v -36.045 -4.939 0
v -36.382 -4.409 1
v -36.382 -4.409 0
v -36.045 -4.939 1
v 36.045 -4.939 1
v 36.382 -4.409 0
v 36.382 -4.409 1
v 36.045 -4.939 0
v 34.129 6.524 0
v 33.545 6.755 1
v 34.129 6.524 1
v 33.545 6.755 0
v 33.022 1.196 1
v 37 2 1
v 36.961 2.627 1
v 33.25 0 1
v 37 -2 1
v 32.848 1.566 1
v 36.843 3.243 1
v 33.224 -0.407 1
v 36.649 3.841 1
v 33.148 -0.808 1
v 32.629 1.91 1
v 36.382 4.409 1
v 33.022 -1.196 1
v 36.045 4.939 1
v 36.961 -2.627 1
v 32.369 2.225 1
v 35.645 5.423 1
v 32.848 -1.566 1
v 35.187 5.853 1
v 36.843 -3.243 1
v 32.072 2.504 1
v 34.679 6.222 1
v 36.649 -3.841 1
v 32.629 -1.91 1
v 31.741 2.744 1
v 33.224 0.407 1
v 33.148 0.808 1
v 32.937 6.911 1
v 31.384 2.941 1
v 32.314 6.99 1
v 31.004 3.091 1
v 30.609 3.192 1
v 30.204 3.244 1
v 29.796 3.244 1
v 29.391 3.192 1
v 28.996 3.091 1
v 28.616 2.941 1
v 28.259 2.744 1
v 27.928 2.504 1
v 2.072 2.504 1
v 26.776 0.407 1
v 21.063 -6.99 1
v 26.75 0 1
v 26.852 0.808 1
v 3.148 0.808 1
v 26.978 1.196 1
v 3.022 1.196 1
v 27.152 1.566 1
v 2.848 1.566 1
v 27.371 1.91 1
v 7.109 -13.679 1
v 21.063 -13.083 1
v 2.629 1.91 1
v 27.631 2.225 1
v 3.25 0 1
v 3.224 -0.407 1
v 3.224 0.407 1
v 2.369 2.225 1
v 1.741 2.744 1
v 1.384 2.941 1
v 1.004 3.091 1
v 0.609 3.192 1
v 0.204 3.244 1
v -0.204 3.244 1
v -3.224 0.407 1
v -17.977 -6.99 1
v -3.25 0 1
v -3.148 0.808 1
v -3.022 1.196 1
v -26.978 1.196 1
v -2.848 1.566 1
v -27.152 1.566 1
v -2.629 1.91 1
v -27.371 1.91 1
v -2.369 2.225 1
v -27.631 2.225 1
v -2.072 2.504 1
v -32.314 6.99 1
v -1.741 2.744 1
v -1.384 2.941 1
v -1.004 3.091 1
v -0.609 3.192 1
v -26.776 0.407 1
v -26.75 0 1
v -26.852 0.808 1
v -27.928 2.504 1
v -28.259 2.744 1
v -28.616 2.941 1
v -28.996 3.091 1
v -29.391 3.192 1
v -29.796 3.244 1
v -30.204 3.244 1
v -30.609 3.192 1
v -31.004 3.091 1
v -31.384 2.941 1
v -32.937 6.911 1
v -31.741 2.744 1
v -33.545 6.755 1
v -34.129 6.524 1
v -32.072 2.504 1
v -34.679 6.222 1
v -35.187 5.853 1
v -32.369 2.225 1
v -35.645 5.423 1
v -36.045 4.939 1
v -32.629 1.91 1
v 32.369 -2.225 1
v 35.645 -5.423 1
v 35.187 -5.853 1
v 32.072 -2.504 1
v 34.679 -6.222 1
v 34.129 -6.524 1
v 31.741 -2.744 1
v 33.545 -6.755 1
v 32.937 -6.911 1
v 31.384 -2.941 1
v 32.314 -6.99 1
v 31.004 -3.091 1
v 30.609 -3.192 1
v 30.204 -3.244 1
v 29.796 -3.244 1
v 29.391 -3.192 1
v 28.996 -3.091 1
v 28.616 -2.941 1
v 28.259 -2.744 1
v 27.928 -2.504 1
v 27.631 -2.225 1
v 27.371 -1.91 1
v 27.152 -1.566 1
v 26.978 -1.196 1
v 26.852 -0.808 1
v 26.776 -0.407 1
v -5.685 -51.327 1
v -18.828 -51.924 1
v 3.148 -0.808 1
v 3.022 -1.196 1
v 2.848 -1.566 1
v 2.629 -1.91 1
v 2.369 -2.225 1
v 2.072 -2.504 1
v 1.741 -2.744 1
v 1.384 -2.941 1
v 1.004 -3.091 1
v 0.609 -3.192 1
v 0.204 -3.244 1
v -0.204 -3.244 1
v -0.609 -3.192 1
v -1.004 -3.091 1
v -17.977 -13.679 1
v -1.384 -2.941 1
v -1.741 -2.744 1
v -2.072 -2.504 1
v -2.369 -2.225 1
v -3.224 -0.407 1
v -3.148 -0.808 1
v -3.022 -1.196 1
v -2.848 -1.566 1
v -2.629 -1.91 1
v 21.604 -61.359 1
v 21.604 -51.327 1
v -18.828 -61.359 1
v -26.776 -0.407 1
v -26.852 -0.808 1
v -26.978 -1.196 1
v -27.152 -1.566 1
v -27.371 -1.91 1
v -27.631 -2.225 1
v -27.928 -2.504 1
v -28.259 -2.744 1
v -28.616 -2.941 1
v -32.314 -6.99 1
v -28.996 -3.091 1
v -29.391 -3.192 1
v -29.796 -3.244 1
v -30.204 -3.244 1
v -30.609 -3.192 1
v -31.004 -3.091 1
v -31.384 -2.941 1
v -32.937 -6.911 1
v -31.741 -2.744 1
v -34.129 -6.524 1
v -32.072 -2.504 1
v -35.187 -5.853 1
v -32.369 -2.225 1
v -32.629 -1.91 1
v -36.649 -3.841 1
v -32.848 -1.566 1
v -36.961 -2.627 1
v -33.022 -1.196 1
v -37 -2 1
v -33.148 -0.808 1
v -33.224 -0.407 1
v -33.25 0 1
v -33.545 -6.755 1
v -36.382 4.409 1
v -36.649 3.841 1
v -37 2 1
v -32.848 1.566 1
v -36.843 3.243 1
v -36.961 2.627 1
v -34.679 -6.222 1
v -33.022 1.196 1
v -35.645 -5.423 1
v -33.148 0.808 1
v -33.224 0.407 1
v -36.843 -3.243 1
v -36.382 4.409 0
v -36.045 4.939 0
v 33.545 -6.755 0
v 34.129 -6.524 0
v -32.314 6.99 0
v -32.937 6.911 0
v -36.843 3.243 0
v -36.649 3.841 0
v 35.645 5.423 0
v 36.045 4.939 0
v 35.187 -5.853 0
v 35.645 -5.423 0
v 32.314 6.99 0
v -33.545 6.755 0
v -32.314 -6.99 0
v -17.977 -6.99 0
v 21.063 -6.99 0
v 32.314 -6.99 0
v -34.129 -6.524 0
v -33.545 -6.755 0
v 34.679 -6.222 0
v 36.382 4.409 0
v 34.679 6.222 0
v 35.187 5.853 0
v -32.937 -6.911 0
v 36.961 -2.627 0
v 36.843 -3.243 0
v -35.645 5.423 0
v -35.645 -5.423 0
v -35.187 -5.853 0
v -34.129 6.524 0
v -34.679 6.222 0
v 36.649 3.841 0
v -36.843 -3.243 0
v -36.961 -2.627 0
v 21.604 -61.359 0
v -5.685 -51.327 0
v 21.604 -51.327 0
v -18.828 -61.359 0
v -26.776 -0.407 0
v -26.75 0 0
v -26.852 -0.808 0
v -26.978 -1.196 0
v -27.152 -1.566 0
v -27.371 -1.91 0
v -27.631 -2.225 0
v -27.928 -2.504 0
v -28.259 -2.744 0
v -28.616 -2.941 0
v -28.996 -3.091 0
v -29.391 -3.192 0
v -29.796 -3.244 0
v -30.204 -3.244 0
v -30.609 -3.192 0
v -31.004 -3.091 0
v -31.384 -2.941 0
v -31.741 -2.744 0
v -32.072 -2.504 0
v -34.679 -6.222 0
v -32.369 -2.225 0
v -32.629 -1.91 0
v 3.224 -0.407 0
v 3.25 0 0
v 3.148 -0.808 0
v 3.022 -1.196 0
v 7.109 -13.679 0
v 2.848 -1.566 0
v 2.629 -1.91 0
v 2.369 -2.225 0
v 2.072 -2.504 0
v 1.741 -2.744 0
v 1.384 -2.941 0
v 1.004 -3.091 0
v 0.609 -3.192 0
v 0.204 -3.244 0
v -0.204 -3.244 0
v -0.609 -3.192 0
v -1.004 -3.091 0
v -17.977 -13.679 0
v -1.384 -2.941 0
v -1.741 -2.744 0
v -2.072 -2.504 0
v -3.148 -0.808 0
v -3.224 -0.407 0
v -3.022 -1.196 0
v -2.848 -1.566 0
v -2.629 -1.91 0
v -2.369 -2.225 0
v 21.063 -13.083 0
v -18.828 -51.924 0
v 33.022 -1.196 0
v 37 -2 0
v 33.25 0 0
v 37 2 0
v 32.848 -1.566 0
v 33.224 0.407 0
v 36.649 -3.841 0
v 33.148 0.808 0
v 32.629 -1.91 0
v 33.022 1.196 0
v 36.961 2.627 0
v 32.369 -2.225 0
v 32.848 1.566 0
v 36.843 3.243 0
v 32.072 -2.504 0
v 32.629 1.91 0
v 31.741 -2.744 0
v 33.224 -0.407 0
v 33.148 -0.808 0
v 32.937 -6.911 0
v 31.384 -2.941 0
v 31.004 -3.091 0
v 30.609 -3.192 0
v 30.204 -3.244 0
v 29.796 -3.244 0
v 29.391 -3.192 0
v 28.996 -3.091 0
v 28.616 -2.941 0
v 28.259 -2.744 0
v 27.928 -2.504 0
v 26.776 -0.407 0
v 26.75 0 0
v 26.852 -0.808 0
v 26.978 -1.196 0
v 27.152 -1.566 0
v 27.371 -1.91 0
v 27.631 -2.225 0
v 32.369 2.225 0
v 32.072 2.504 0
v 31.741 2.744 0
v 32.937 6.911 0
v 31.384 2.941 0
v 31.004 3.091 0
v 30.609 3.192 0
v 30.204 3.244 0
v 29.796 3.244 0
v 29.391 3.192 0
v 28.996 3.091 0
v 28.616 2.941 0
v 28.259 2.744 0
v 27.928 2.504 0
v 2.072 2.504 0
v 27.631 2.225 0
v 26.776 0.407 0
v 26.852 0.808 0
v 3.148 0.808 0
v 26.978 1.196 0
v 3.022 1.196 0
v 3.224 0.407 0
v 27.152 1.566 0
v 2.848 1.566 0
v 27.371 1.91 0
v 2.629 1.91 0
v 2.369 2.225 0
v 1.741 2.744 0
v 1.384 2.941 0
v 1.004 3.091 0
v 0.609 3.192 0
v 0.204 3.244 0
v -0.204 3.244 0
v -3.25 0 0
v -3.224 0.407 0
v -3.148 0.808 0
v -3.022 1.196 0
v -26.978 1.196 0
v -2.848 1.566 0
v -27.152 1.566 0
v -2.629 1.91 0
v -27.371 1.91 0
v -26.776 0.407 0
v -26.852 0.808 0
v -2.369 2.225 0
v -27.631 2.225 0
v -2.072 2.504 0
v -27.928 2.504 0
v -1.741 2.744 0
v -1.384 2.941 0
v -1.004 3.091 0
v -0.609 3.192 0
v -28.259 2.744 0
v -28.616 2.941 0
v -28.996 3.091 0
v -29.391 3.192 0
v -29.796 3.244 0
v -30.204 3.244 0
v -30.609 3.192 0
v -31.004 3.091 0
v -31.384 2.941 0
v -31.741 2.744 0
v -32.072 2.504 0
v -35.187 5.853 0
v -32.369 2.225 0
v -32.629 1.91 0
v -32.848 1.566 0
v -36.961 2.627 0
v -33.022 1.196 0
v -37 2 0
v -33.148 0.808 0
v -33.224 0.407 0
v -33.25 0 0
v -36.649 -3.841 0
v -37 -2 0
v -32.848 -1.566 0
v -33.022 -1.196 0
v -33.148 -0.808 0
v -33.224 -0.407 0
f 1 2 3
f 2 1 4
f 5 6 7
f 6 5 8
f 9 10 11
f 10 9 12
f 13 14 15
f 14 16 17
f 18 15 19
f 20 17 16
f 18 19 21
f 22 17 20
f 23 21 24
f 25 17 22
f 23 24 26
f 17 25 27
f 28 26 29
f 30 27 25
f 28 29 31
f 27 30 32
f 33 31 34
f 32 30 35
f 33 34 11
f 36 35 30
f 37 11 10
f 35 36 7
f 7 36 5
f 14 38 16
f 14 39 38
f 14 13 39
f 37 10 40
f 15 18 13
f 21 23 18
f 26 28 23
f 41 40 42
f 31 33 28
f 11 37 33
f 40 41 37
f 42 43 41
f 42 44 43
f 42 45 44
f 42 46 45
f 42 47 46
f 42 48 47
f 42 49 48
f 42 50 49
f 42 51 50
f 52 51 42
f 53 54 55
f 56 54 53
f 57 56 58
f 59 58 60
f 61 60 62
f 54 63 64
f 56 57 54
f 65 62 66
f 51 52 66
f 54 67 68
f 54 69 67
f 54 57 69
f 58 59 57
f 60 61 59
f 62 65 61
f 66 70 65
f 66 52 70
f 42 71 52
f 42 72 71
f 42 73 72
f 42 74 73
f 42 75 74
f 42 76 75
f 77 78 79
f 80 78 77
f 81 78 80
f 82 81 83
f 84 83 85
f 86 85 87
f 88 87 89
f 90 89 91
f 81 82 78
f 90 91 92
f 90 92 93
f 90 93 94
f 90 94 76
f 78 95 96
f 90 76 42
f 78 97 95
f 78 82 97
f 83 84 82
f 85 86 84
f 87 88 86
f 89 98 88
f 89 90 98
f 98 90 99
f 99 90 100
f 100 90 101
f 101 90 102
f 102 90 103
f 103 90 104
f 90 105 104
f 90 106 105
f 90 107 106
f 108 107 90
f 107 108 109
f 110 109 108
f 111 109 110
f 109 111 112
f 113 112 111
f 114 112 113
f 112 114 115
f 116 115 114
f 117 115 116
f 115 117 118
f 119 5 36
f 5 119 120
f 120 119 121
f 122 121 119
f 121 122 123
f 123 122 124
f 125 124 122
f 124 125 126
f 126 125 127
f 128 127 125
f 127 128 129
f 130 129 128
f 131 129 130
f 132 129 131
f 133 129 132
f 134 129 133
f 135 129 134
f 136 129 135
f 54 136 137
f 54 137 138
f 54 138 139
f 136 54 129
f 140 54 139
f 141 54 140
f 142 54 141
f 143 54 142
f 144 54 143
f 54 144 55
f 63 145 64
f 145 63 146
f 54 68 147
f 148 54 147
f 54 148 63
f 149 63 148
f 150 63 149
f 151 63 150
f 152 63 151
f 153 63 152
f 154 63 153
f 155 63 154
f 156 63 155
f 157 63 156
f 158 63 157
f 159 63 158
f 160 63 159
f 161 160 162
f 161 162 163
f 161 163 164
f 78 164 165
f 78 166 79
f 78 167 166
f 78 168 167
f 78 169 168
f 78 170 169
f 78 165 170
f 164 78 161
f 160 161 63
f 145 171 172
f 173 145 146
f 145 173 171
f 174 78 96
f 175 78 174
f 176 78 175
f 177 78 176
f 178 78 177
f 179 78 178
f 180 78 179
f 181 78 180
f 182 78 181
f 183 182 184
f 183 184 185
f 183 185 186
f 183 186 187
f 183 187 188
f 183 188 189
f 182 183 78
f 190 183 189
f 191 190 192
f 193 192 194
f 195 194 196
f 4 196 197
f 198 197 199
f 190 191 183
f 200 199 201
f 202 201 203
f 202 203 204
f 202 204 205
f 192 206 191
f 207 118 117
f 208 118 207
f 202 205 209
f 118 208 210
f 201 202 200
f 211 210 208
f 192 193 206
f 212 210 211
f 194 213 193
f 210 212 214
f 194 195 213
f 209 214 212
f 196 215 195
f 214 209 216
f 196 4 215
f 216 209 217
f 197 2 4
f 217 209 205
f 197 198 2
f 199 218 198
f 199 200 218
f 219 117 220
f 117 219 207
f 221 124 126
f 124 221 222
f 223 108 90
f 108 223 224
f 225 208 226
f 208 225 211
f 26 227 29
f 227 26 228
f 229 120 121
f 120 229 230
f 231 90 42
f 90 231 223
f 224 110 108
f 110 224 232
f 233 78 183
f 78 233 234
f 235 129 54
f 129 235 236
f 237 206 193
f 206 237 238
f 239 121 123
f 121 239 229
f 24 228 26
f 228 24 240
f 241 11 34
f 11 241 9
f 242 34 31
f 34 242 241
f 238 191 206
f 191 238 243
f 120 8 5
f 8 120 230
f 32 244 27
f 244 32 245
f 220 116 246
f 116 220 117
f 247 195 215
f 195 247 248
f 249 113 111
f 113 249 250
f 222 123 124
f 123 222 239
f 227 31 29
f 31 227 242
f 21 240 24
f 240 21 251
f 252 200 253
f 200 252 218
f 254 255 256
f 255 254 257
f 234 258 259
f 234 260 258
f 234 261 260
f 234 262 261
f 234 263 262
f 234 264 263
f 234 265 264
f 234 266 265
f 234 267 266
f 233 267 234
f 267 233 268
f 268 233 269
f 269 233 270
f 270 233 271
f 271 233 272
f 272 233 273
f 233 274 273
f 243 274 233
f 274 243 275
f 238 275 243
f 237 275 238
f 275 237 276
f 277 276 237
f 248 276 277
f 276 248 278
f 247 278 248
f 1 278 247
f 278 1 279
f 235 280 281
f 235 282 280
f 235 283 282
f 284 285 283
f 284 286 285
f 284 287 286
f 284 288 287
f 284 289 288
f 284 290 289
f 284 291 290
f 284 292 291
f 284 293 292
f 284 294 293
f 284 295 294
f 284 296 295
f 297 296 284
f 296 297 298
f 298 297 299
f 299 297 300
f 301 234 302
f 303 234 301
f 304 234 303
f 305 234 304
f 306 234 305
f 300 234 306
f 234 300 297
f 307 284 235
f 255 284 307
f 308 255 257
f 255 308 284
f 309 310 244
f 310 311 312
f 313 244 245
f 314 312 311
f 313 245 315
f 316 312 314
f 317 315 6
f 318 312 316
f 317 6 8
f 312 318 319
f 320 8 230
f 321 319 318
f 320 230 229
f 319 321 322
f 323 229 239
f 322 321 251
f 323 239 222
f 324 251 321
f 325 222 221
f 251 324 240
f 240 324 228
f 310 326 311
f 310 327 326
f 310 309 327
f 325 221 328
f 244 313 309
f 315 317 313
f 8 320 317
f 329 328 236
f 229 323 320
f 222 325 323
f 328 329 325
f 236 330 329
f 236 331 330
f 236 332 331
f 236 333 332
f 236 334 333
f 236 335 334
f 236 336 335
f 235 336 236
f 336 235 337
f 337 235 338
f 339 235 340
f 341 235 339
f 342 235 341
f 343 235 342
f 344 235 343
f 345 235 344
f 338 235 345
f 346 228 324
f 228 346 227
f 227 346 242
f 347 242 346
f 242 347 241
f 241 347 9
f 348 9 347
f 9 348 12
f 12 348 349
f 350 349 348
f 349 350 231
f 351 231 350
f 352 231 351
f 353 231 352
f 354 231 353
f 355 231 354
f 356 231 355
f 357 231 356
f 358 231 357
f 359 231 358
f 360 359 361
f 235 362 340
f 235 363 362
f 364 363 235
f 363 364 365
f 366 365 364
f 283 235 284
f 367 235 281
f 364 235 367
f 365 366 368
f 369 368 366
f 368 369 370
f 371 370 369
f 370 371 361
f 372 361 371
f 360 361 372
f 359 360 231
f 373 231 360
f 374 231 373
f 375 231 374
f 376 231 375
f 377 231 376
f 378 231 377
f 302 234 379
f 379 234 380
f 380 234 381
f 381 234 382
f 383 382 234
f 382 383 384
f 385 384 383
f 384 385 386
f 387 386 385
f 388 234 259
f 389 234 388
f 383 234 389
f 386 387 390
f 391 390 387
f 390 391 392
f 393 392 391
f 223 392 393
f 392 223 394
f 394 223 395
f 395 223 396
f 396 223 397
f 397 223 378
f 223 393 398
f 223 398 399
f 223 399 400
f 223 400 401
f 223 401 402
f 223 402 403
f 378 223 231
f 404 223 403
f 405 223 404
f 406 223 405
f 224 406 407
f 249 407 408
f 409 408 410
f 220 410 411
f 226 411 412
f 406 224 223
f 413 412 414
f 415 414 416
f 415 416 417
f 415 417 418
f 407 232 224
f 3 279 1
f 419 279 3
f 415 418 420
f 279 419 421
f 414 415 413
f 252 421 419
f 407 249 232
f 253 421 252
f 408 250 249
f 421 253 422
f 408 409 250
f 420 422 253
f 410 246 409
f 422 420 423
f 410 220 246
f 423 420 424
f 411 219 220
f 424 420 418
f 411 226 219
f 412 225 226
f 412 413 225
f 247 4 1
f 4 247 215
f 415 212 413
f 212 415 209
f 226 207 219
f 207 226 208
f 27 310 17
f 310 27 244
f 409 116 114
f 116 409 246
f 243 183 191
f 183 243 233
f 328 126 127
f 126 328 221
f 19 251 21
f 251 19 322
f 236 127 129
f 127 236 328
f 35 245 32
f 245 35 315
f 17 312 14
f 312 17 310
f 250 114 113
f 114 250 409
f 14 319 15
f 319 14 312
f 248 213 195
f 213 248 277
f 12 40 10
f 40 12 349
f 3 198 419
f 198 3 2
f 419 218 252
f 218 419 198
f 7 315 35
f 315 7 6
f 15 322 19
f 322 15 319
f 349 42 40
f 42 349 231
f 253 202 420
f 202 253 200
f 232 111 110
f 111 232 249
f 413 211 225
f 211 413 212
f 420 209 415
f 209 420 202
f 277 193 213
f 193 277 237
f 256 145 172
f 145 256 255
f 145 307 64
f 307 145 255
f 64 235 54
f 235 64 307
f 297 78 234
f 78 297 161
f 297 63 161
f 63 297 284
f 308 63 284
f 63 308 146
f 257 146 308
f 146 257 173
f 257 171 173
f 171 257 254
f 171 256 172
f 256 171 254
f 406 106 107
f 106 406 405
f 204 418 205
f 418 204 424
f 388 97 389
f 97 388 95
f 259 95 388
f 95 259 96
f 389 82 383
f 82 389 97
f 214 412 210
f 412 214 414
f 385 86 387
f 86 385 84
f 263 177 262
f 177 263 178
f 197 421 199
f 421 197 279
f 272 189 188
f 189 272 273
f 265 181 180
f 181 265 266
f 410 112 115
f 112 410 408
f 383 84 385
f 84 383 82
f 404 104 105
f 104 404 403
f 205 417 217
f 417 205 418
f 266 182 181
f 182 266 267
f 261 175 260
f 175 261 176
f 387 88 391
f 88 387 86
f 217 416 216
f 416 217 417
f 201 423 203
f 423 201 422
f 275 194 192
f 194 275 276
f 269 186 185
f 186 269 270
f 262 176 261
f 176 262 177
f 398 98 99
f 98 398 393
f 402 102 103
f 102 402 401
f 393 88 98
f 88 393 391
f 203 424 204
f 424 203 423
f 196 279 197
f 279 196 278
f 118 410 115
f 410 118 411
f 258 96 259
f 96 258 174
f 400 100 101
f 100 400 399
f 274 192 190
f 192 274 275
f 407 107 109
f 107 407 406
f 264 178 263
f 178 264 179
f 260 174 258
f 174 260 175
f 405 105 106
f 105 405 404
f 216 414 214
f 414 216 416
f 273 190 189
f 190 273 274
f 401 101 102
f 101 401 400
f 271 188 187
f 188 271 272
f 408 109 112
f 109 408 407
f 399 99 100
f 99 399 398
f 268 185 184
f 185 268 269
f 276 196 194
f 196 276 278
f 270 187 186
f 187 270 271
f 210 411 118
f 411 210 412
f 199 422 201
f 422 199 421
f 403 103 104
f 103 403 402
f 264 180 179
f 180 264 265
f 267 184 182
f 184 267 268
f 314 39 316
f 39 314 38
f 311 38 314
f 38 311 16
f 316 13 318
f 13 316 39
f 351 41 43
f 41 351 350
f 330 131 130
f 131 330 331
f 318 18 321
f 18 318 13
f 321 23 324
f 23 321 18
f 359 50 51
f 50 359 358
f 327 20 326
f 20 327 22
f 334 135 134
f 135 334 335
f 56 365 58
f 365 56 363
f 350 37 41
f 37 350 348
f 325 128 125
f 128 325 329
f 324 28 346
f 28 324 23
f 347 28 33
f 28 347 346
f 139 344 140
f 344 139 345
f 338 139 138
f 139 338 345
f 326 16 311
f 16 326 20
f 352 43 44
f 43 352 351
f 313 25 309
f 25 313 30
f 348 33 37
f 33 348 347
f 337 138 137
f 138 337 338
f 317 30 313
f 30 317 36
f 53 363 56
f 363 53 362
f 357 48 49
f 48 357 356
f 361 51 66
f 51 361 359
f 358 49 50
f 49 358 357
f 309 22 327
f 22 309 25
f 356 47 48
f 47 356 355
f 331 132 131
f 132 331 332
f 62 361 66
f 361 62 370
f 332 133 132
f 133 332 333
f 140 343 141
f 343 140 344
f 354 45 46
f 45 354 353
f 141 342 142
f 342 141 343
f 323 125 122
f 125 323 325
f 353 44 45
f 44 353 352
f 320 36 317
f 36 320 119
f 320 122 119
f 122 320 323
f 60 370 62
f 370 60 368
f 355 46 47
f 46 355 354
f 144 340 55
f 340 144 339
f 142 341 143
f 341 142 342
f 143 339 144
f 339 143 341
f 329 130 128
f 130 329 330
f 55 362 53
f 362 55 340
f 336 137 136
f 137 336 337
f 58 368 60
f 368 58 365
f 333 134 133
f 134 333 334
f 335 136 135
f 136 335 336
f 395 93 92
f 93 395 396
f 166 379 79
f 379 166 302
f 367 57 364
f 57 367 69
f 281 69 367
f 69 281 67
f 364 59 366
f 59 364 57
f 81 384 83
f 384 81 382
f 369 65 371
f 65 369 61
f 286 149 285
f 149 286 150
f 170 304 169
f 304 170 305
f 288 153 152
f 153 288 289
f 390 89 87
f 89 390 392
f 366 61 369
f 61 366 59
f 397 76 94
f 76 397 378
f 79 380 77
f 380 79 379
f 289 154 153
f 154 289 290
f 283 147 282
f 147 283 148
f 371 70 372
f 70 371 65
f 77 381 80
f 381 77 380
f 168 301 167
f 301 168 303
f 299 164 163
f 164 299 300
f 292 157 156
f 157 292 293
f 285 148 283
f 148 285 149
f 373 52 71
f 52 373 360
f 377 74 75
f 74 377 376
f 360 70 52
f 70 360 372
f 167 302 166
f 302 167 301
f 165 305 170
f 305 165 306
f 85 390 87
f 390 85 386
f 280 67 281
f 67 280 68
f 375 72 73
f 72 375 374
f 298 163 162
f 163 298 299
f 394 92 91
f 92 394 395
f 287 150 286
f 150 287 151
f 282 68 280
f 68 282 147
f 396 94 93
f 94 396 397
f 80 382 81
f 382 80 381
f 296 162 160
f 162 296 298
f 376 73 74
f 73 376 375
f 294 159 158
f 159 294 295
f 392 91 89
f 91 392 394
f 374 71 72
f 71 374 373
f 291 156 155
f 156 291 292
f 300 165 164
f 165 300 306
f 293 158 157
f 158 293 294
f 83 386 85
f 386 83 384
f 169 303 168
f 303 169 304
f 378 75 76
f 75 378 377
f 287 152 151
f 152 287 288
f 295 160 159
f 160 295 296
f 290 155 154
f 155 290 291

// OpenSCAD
$fn = 50;


difference() {
	union() {
		translate(v = [0, 0, 0]) {
			rotate(a = [0, 0, 0]) {
				hull() {
					translate(v = [-32.0000000000, 2.0000000000, 0]) {
						rotate(a = [0, 0, 0]) {
							translate(v = [0, 0, 0]) {
								rotate(a = [0, 0, 0]) {
									cylinder(h = 1, r = 5);
								}
							}
						}
					}
					translate(v = [32.0000000000, 2.0000000000, 0]) {
						rotate(a = [0, 0, 0]) {
							translate(v = [0, 0, 0]) {
								rotate(a = [0, 0, 0]) {
									cylinder(h = 1, r = 5);
								}
							}
						}
					}
					translate(v = [-32.0000000000, -2.0000000000, 0]) {
						rotate(a = [0, 0, 0]) {
							translate(v = [0, 0, 0]) {
								rotate(a = [0, 0, 0]) {
									cylinder(h = 1, r = 5);
								}
							}
						}
					}
					translate(v = [32.0000000000, -2.0000000000, 0]) {
						rotate(a = [0, 0, 0]) {
							translate(v = [0, 0, 0]) {
								rotate(a = [0, 0, 0]) {
									cylinder(h = 1, r = 5);
								}
							}
						}
					}
				}
			}
		}
		translate(v = [0, -5, 0]) {
			rotate(a = [0, 0, 0]) {
				linear_extrude(height = 1) {
					text(font = "DejaVu Sans Mono:style=Bold", halign = "center", size = 57.0000000000, text = "Z", valign = "top");
				}
			}
		}
	}
	union() {
		translate(v = [-30.0000000000, 0.0000000000, -125.0000000000]) {
			rotate(a = [0, 0, 0]) {
				cylinder(h = 250, r = 3.2500000000);
			}
		}
		translate(v = [30.0000000000, 0.0000000000, -125.0000000000]) {
			rotate(a = [0, 0, 0]) {
				cylinder(h = 250, r = 3.2500000000);
			}
		}
		translate(v = [30.0000000000, 0.0000000000, -125.0000000000]) {
			rotate(a = [0, 0, 0]) {
				cylinder(h = 250, r = 3.2500000000);
			}
		}
		translate(v = [0, 0, -125.0000000000]) {
			rotate(a = [0, 0, 0]) {
				cylinder(h = 250, r = 3.2500000000);
			}
		}
	}
}
